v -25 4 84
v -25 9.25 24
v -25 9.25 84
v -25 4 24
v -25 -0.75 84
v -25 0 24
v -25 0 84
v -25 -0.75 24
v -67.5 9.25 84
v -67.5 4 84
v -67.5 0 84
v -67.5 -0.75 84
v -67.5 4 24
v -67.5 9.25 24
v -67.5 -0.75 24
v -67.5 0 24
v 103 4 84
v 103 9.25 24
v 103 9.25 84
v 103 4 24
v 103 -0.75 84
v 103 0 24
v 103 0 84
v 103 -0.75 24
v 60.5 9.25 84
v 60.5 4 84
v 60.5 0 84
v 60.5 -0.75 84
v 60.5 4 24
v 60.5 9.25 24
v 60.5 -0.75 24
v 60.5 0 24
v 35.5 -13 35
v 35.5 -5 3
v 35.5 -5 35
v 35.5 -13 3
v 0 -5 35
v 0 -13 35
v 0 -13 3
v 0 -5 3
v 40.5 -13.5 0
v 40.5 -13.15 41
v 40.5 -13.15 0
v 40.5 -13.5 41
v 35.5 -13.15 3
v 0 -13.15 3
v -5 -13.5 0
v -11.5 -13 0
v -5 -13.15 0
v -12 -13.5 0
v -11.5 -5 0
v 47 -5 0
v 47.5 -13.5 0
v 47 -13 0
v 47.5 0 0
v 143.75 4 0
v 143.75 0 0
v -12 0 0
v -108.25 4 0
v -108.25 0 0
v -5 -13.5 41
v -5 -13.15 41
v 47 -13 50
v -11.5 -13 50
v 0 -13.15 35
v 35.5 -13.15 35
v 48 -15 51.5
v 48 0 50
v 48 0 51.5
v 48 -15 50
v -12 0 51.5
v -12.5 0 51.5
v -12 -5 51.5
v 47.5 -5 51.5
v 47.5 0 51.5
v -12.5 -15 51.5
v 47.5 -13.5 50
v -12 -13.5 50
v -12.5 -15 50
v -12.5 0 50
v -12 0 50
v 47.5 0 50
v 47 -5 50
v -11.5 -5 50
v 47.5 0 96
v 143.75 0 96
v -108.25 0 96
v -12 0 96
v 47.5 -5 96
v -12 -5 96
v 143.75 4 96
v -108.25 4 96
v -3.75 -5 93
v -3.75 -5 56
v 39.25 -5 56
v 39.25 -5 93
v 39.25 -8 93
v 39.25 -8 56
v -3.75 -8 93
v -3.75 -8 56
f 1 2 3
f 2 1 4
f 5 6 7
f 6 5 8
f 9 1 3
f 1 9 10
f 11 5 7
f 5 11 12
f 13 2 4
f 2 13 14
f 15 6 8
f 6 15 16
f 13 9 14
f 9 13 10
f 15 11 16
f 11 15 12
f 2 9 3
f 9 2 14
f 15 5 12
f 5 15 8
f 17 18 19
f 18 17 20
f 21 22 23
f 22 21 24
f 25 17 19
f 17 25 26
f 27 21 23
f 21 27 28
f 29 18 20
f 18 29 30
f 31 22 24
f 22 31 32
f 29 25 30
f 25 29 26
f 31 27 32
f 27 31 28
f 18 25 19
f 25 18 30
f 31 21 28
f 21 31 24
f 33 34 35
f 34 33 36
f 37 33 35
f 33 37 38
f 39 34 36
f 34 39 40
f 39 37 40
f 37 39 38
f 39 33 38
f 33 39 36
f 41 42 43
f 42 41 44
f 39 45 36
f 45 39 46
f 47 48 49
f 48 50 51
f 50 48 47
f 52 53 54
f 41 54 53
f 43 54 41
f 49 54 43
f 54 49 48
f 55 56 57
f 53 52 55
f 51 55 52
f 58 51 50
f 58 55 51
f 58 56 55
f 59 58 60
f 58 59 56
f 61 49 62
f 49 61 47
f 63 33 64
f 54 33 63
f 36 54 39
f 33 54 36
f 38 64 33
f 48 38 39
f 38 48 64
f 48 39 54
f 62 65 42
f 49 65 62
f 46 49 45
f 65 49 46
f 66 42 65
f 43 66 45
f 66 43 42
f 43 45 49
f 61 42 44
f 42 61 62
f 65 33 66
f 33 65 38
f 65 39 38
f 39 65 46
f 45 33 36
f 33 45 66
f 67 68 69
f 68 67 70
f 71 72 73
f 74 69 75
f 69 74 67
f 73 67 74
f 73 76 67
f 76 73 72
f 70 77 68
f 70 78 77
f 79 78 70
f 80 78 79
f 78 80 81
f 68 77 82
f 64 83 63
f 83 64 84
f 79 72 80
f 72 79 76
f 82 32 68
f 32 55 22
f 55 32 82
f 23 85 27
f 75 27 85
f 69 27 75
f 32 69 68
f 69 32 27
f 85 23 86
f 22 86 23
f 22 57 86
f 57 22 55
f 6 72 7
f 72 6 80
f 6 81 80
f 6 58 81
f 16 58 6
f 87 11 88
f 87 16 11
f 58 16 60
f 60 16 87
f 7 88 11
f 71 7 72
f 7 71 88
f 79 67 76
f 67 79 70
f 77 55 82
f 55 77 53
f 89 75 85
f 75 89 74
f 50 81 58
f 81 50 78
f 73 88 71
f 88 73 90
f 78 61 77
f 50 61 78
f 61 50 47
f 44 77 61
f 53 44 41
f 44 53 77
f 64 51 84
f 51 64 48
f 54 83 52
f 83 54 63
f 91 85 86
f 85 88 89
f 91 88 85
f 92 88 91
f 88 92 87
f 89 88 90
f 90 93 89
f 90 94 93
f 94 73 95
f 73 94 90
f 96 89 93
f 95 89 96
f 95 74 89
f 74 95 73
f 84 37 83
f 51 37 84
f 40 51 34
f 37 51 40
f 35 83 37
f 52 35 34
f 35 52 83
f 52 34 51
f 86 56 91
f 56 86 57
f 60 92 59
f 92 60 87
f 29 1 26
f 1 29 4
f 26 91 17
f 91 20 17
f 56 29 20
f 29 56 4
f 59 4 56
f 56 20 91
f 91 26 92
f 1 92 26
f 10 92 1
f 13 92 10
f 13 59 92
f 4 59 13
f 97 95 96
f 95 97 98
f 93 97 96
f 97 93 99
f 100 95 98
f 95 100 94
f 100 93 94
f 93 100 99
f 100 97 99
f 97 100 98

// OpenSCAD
// Fireplace parameteric model V1
// 


/* [Colors (Red, Green, Blue)] */
// Ceiling
Ceil_Color = [0.95,0.95,0.95]; //[0:0.05:1]
ceil_color = Ceil_Color;
// Mantel
Matel_Color = [0.95,0.95,0.95]; //[0:0.05:1]
mantel_color = Matel_Color;
// Tile (right next to firebox)
Tile_Color = [0.75,0.75,0.75]; //[0:0.05:1]
tile_color = Tile_Color;
// Wall
Wall_Color = [0.45,0.45,0.45]; //[0:0.05:1]
wall_color = Wall_Color;
// Picture
Picture_Color = [0.75,0.75,0.75]; //[0:0.05:1]
picture_color = Picture_Color;
// Floor
Floor_Color = [0.45,0.35,0.15]; //[0:0.05:1]
floor_color = Floor_Color;


/* [Firebox Dimensions && Placement] */
// Width of the firebox opening
firebox_w = 35.5;//[0:0.1:40.0]
// Height of the firebox opening
firebox_h = 32.0;//[0:0.1:40.0]
// Depth of firebox (shouldn't really mater in most cases)
firebox_d = 16;//[0:0.1:10.0]
//How far does the firebox sticks out into the room (inch)
from_wall_d = 13; //[0:0.1:16.0]


/* [Shelf Overhang && Thickness] ************************/
//Shelf overhang on left and right ends
mantel_shelf_overhang_w = 0.5; //[0:0.25:10.0] 
//Shelf overhang into the room from mantel body
mantel_shelf_overhang_d = 1.5; //[0:0.25:10.0]
//Shelf thickness height
mantel_shelf_h = 1.5;


/* [Mantel Height Adjustments] */
//Mantel visible on top of the tile below the shelf
mantel_top_h = 9;//[0:0.25:15.0]
//Tile visible on top of the firebox
tile_top_h = 6; //[0:0.25:192.0]
//Lift Firebox Up
firebox_lift_height = 3;//[0:0.1:10]

/* [Mantel Width Adjustments] */
//Mantel visible on each side of the tile
mantel_leg_w = 7;//[0:0.25:15.0]
//Tile visible on each side of the firebox
tile_leg_w = 5; //[0:0.25:20.0]

/* [Thickness && Side Material] */
// Thickness of the tile
tile_depth = 0.15;
//Tile Sides - tiles the sides
tile_sides = false;
//Thickness of the material
mantel_front_d = .5;


/* [Fireplace Bump Out] */
//Show the mantel bump out
show_above_mantel = true;
//Above fireplace (inch)
above_fireplace_depth = 5;//[0:0.1:10.0]
above_fireplace_width_inset = 0;

/* [Room] */
//Show Wall
show_wall = true;
//Height of ceiling (inch)
ceiling_height = 96; //[36:0.5:192]
// Show ceiling
show_ceil = false;
//Width of the wall (feet)
wall_width_feet = 21; // [0:0.25:50]
//Show Floor
show_floor = false;
//Floor depth from wall (feet)
floor_depth_feet = 21; // [0:0.25:50]

//Show Windows
show_windows = true;
//Distance between windows
window_distance = 85.5; //[0:0.5:192]
//Windows width, height
window_dimensions = [42.5, 60];
//Window height above floor
window_above_floor = 24; //[0:0.5:192]

/* [Picture] */
//Show Picture over mantel
show_picture = true;
//Picture Width,Height,Depth 
picture_dim = [43, 37, 3];
//Picture Height above floor
picture_z = 56; //[0:0.5:192]
// Picture Color (R,G,B)
//Picture_Color = [0.75,0.75,0.75]; //[0:0.05:1]
//picture_color = Picture_Color;

/* [Show Dimensions] */
// Show Dimensions (inch)
show_dims = true;


// *********************************************************************

// Firebox
color("black")
translate([0, -from_wall_d, firebox_lift_height]) 
cube([firebox_w,firebox_d,firebox_h], false);

//Under Firebox
    uf_w = firebox_w + (tile_leg_w * 2); 
    uf_d = tile_depth;
    uf_h = firebox_lift_height;

    uf_x = -tile_leg_w;
    uf_y = -tile_depth - from_wall_d;

    color(tile_color)
    translate([uf_x, uf_y])
    cube([uf_w,uf_d,uf_h], false);

// Tile Top
    tt_w = (2 * tile_leg_w) + firebox_w;
    tt_d = tile_depth;
    tt_h = tile_top_h;

    tt_x = -tile_leg_w;
    tt_y =  -tile_depth - from_wall_d;
    tt_z = firebox_lift_height + firebox_h;

    color(tile_color)
    translate([tt_x, tt_y, tt_z]) 
    cube([tt_w,,tt_d, tt_h], false);

// Tile Legs (tile next to firebox horizontal sides)
    tl_w = tile_leg_w;
    tl_d = tile_depth;
    tl_h = firebox_h;

    tl_l_x = -tl_w;
    tl_y = -tile_depth - from_wall_d;
    tl_z = firebox_lift_height;

    color(tile_color)
    translate([tl_l_x, tl_y, tl_z]) 
    cube([tl_w,tl_d, tl_h], false);


    tl_r_x = firebox_w;

    color(tile_color)
    translate([tl_r_x, tl_y, tl_z]) 
    cube([tl_w,tl_d, tl_h], false);
    
// Mantel Shelf
    shelf_w = (2 * tile_leg_w) + firebox_w + (2 * mantel_leg_w) + (2 * mantel_shelf_overhang_w);
    shelf_d = mantel_shelf_overhang_d + mantel_front_d + from_wall_d;
    shelf_h = mantel_shelf_h;

    shelf_x = -tile_leg_w - mantel_leg_w - mantel_shelf_overhang_w;
    shelf_y = -shelf_d;
    shelf_z = firebox_h + tile_top_h + mantel_top_h + firebox_lift_height;

    color(mantel_color)
    translate([shelf_x, shelf_y, shelf_z]) 
    cube([shelf_w, shelf_d, shelf_h], false);

// Mantel Top (wood or other material under shelf)
    mt_w = (2 * tile_leg_w) + firebox_w + (2 * mantel_leg_w);
    mt_d = mantel_front_d;
    mt_h = mantel_top_h;

    mt_x = -tile_leg_w - mantel_leg_w;
    mt_y = -mantel_front_d - from_wall_d;
    mt_z = firebox_h + tile_top_h + firebox_lift_height;

    color(mantel_color)
    translate([mt_x, mt_y, mt_z]) 
    cube([mt_w,mt_d, mt_h], false);
    
// Mantel Legs (wood or other material on horizontal outside of  tile and firebox)
    m_w = mantel_leg_w;
    m_d = mantel_front_d;
    m_h = firebox_h + tile_top_h + firebox_lift_height;

    m_l_x = -tile_leg_w - mantel_leg_w;
    m_y = -mantel_front_d - from_wall_d;

    color(mantel_color)
    translate([m_l_x, m_y]) 
    cube([m_w, m_d, m_h], false);

    m_r_x = firebox_w + tile_leg_w;

    color(mantel_color)
    translate([m_r_x, m_y]) 
    cube([m_w, m_d, m_h], false);

// Mantel Returns Top
    returnt_w = mantel_front_d;
    returnt_d = from_wall_d;
    returnt_h = mantel_top_h;

    returnt_l_x = -tile_leg_w - mantel_leg_w;
    returnt_y = - from_wall_d;
    returnt_z = firebox_h + tile_top_h + firebox_lift_height;

    color(mantel_color)
    translate([returnt_l_x, returnt_y, returnt_z]) 
    cube([returnt_w,returnt_d, returnt_h], false);

    returnt_r_x = firebox_w + tile_leg_w + mantel_leg_w - mantel_front_d;
    color(mantel_color)
    translate([returnt_r_x, returnt_y, returnt_z]) 
    cube([returnt_w,returnt_d, returnt_h], false);

// Mantel Returns Bottom
    // test ? TrueValue : FlaseValue
    returnb_color = tile_sides ? tile_color : mantel_color ;

    returnb_w = mantel_front_d;
    returnb_d = from_wall_d;
    returnb_h = firebox_h + tile_top_h + firebox_lift_height;

    returnb_l_x = -tile_leg_w - mantel_leg_w;
    returnb_y = - from_wall_d;

    color(returnb_color)
    translate([returnb_l_x, returnb_y]) 
    cube([returnb_w,returnb_d, returnb_h], false);

    returnb_r_x = firebox_w + tile_leg_w + mantel_leg_w - mantel_front_d;
    color(returnb_color)
    translate([returnb_r_x, returnb_y]) 
    cube([returnb_w,returnb_d, returnb_h], false);

// Above Mantel
if (show_above_mantel) {
    above_w = firebox_w + (2 * tile_leg_w) + (2 * mantel_leg_w) - (above_fireplace_width_inset * 2);
    above_d = above_fireplace_depth;
    above_h = ceiling_height;

    above_x = (firebox_w/2) - (above_w/2);
    above_y = -above_d;
    above_z = 0;
    color("gray")
    translate([above_x, above_y, above_z]) 
    cube([above_w, above_d, above_h], false);
}

// Windows
if (show_windows) {
    window_w = window_dimensions[0];
    window_d = 10;
    window_h = window_dimensions[1];
    // Left Window
    window_l_x = 0 + (firebox_w/2) - window_w - (window_distance/2);
    window_y = -0.75;
    window_z = window_above_floor;
    translate([window_l_x, window_y, window_z]) 
    cube([window_w, window_d, window_h], false);
    // Right Window
    window_r_x = (window_distance/2) + (firebox_w/2);
    translate([window_r_x, window_y, window_z]) 
    cube([window_w, window_d, window_h], false);
}

// Wall
if (show_wall) {
    wall_w = wall_width_feet*12;
    wall_d = 4;
    wall_h = ceiling_height;
    
    wall_x = -wall_w/2 + (firebox_w/2);
    color(wall_color)
    translate([wall_x, 0, 0]) 
    cube([wall_w, wall_d, wall_h], false);
}

if (show_floor) {
    floor_w = wall_width_feet*12;
    floor_d = floor_depth_feet*12;
    floor_h = 1;
    
    floor_x = -(wall_width_feet*12)/2 + (firebox_w/2);
    floor_y = -floor_d;
    color(floor_color)
    translate([floor_x, floor_y, -floor_h]) 
    cube([floor_w, floor_d, floor_h], false);
}

if (show_ceil) {
    ceil_w = wall_width_feet*12;
    ceil_d = floor_depth_feet*12;
    ceil_h = 1;
    
    ceil_x = -(wall_width_feet*12)/2 + (firebox_w/2);
    ceil_y = -ceil_d;
    ceil_z  = ceiling_height;
    color(ceil_color)
    translate([ceil_x, ceil_y, ceil_z]) 
    cube([ceil_w, ceil_d, ceil_h], false);
}

// Picture
if (show_picture) {
    // If the above mantel bump-out is enabled
    above_y = show_above_mantel ? -above_fireplace_depth : 0;
    
    pic_w = picture_dim[0];
    pic_d = 3;
    pic_h = picture_dim[1];

    pic_x = firebox_w/2 - pic_w/2;
    pic_y = above_y - pic_d;
    pic_z = picture_z;

    color(picture_color)
    translate([pic_x, pic_y, pic_z]) 
    cube([pic_w, pic_d, pic_h], false);
}



// -----------------------------------------------------------------
// Shelf Width Dimension

if (show_dims) {
    // Shelf Width
    dim_x = firebox_w + tile_leg_w + mantel_leg_w;
    dim_y = shelf_y - mantel_front_d - 5;
    
    mantel_wshelf_dim_str = str("Shelf Width ",str(shelf_w));
    
    color("red")
    translate([dim_x, dim_y, shelf_z])
    rotate([90])
    text(str(mantel_wshelf_dim_str), size= 5, halign = "left");

    // Shelf depth
    above_d = show_above_mantel ? above_fireplace_depth : 0;
    shelf_depth = shelf_d - above_d;
    
    mantel_shelf_depth_dim_str = str("Shelf Depth ",str(shelf_depth));
    
    color("red")
    translate([dim_x, dim_y, shelf_z + 6])
    rotate([90])
    text(mantel_shelf_depth_dim_str, size=5, halign = "left");

    // Front Width Dimension
    front_w = firebox_w + (2 * tile_leg_w) + (2 * mantel_leg_w);
    
    mantel_wfront_dim_str = str("Front Width ",str(shelf_w));
    
    color("red")
    translate([dim_x, dim_y, 0])
    rotate([90])
    text(mantel_wfront_dim_str, size=5, halign = "left");

    // Heigth Dimension
    mantel_h = shelf_z + mantel_shelf_h;
    
    mantel_h_dim_str = str("Heigth ",str(mantel_h));
    
    color("red")
    translate([dim_x , dim_y, mantel_h/2])
    rotate([90])
    text(mantel_h_dim_str, size=5, halign = "left");
    
    // Side Dimensions
    above_y = show_above_mantel ? above_fireplace_depth : 0;
    mantel_d_side = above_fireplace_width_inset < 0 ? mantel_front_d + from_wall_d - above_y : mantel_front_d + from_wall_d;
    
    mantel_d_side_dim_str = str("Side Depth ",str(mantel_d_side));
    
    color("red")
    translate([dim_x , dim_y, (mantel_h/2) - 6])
    rotate([90])
    text(mantel_d_side_dim_str, size=5, halign = "left");

}
